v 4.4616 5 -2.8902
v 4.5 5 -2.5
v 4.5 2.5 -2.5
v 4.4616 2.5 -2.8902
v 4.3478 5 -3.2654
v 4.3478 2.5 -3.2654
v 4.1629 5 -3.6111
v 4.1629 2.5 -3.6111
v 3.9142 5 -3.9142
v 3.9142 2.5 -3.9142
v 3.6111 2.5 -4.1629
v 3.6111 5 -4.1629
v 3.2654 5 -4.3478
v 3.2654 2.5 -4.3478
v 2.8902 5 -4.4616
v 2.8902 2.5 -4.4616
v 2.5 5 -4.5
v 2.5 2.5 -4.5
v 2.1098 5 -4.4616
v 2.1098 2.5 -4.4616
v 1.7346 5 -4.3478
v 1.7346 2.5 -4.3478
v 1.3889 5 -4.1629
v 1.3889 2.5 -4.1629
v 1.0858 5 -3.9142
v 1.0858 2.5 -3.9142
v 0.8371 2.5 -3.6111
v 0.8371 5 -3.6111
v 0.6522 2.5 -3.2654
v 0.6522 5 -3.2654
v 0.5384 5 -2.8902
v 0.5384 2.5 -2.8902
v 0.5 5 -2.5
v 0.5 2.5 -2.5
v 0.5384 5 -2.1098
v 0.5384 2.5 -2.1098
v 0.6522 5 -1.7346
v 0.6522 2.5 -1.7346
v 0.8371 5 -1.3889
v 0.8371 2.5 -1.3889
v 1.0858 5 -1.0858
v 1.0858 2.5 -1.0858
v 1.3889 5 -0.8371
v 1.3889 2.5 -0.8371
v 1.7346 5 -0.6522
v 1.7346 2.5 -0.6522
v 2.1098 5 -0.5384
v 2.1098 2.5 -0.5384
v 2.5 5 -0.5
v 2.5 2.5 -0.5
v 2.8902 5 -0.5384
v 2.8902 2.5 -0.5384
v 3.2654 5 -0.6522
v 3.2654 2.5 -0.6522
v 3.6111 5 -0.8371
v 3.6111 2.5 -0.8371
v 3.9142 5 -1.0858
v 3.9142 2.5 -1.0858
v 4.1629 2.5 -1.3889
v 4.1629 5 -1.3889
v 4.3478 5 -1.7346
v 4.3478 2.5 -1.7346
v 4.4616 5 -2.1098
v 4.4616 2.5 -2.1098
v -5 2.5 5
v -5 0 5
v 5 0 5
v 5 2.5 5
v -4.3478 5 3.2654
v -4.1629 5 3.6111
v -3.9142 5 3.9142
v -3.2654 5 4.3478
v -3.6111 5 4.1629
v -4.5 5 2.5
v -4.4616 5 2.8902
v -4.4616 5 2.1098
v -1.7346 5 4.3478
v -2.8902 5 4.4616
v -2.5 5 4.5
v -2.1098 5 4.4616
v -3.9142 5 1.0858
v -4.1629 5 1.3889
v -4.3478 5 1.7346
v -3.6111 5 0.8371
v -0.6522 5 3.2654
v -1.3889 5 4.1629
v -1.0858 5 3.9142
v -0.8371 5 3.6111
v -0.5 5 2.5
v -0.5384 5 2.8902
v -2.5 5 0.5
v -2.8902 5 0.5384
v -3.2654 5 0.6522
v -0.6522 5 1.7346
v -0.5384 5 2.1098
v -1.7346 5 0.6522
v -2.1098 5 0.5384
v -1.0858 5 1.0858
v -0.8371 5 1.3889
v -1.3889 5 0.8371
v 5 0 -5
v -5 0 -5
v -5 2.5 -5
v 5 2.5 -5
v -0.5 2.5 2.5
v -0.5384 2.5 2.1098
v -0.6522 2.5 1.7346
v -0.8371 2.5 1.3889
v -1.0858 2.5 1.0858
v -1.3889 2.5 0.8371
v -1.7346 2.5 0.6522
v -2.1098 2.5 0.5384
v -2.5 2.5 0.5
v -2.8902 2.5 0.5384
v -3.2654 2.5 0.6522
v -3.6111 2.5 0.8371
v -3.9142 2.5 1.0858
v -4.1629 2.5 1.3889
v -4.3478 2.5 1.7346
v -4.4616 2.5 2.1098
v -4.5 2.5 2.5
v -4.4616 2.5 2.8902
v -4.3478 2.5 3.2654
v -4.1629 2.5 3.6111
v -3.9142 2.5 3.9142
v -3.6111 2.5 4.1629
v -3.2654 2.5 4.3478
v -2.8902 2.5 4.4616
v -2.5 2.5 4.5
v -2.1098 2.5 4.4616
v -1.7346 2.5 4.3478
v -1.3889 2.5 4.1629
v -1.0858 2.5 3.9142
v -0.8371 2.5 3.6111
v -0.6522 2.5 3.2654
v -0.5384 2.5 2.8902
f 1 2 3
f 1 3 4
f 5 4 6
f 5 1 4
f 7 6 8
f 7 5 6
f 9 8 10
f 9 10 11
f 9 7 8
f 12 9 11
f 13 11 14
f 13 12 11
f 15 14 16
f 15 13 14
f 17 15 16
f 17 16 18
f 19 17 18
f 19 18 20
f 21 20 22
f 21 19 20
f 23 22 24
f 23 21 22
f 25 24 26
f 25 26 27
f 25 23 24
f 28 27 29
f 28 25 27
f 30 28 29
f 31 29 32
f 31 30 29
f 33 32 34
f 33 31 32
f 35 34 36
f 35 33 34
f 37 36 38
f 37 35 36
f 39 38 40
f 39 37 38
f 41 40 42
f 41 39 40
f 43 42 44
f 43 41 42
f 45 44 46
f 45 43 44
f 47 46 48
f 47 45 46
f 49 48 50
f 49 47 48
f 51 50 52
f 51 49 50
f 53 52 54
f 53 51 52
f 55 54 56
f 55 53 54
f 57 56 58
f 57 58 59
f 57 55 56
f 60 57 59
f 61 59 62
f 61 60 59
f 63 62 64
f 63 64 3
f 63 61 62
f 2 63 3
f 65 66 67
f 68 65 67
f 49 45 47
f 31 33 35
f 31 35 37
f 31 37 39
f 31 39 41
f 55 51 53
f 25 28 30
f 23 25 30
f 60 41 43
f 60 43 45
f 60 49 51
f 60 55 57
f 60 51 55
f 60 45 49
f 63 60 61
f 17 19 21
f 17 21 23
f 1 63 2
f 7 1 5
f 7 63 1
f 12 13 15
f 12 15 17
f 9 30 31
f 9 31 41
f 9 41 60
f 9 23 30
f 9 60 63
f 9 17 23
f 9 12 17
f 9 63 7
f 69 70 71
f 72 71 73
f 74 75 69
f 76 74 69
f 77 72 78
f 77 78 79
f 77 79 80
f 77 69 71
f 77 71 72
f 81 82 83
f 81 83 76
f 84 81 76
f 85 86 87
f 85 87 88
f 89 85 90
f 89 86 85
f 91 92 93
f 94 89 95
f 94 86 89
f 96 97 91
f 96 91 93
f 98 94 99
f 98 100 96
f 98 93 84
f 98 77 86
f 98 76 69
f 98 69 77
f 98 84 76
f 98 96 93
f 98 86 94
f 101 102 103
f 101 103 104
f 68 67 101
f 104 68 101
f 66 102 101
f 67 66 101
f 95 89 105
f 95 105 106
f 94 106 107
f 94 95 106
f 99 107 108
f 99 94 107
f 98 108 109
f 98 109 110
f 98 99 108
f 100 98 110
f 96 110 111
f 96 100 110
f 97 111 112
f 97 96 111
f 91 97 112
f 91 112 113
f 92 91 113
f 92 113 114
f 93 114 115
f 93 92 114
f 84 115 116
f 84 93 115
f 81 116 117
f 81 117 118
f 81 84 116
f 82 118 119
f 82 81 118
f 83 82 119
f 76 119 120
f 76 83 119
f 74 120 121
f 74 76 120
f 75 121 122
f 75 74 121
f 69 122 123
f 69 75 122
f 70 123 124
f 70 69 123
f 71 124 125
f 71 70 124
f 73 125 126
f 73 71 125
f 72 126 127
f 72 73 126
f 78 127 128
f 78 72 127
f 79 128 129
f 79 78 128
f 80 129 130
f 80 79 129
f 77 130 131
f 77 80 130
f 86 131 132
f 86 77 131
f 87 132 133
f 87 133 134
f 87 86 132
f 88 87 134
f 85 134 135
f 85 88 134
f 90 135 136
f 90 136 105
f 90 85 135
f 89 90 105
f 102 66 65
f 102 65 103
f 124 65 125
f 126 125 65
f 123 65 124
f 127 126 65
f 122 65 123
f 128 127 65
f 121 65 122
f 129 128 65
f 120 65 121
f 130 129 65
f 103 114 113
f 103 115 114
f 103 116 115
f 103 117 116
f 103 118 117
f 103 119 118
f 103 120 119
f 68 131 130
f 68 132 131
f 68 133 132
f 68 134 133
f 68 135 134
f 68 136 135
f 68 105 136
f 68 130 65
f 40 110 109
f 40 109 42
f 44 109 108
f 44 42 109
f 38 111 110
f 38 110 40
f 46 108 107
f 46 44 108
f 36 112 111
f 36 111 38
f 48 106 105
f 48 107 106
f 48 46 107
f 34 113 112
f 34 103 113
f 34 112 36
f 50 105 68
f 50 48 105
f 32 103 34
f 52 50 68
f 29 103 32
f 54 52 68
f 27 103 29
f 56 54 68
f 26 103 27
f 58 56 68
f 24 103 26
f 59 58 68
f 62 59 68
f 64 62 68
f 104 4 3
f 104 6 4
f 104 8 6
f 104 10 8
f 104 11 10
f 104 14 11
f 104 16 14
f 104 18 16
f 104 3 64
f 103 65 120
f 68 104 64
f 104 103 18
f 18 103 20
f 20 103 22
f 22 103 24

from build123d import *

# Parameters (mm, degrees)
SKETCH1_W           = 10
SKETCH1_H           = 10
BOSS_EXTRUDE1_DEPTH = 5
SKETCH2_W           = 10
SKETCH2_H           = 10
SKETCH2_R           = 2
CUT_EXTRUDE1_DEPTH  = 2.5


with BuildPart() as part:
    # Sketch1 → Boss-Extrude1 (new body)
    with BuildSketch(Plane(origin=(0, 0, 0), x_dir=(1, 0, 0), z_dir=(0, 1, 0))):
        Rectangle(SKETCH1_W, SKETCH1_H)
    extrude(amount=BOSS_EXTRUDE1_DEPTH)

    # Sketch2 → Cut-Extrude1 (cut)
    with BuildSketch(Plane(origin=(0, 5, 0), x_dir=(1, 0, 0), z_dir=(0, 1, 0))):
        Rectangle(SKETCH2_W, SKETCH2_H)
        with Locations((-2.5, -2.5)):
            Circle(SKETCH2_R, mode=Mode.SUBTRACT)
        with Locations((2.5, 2.5)):
            Circle(SKETCH2_R, mode=Mode.SUBTRACT)
    extrude(amount=-CUT_EXTRUDE1_DEPTH, mode=Mode.SUBTRACT)


solid = part.part
